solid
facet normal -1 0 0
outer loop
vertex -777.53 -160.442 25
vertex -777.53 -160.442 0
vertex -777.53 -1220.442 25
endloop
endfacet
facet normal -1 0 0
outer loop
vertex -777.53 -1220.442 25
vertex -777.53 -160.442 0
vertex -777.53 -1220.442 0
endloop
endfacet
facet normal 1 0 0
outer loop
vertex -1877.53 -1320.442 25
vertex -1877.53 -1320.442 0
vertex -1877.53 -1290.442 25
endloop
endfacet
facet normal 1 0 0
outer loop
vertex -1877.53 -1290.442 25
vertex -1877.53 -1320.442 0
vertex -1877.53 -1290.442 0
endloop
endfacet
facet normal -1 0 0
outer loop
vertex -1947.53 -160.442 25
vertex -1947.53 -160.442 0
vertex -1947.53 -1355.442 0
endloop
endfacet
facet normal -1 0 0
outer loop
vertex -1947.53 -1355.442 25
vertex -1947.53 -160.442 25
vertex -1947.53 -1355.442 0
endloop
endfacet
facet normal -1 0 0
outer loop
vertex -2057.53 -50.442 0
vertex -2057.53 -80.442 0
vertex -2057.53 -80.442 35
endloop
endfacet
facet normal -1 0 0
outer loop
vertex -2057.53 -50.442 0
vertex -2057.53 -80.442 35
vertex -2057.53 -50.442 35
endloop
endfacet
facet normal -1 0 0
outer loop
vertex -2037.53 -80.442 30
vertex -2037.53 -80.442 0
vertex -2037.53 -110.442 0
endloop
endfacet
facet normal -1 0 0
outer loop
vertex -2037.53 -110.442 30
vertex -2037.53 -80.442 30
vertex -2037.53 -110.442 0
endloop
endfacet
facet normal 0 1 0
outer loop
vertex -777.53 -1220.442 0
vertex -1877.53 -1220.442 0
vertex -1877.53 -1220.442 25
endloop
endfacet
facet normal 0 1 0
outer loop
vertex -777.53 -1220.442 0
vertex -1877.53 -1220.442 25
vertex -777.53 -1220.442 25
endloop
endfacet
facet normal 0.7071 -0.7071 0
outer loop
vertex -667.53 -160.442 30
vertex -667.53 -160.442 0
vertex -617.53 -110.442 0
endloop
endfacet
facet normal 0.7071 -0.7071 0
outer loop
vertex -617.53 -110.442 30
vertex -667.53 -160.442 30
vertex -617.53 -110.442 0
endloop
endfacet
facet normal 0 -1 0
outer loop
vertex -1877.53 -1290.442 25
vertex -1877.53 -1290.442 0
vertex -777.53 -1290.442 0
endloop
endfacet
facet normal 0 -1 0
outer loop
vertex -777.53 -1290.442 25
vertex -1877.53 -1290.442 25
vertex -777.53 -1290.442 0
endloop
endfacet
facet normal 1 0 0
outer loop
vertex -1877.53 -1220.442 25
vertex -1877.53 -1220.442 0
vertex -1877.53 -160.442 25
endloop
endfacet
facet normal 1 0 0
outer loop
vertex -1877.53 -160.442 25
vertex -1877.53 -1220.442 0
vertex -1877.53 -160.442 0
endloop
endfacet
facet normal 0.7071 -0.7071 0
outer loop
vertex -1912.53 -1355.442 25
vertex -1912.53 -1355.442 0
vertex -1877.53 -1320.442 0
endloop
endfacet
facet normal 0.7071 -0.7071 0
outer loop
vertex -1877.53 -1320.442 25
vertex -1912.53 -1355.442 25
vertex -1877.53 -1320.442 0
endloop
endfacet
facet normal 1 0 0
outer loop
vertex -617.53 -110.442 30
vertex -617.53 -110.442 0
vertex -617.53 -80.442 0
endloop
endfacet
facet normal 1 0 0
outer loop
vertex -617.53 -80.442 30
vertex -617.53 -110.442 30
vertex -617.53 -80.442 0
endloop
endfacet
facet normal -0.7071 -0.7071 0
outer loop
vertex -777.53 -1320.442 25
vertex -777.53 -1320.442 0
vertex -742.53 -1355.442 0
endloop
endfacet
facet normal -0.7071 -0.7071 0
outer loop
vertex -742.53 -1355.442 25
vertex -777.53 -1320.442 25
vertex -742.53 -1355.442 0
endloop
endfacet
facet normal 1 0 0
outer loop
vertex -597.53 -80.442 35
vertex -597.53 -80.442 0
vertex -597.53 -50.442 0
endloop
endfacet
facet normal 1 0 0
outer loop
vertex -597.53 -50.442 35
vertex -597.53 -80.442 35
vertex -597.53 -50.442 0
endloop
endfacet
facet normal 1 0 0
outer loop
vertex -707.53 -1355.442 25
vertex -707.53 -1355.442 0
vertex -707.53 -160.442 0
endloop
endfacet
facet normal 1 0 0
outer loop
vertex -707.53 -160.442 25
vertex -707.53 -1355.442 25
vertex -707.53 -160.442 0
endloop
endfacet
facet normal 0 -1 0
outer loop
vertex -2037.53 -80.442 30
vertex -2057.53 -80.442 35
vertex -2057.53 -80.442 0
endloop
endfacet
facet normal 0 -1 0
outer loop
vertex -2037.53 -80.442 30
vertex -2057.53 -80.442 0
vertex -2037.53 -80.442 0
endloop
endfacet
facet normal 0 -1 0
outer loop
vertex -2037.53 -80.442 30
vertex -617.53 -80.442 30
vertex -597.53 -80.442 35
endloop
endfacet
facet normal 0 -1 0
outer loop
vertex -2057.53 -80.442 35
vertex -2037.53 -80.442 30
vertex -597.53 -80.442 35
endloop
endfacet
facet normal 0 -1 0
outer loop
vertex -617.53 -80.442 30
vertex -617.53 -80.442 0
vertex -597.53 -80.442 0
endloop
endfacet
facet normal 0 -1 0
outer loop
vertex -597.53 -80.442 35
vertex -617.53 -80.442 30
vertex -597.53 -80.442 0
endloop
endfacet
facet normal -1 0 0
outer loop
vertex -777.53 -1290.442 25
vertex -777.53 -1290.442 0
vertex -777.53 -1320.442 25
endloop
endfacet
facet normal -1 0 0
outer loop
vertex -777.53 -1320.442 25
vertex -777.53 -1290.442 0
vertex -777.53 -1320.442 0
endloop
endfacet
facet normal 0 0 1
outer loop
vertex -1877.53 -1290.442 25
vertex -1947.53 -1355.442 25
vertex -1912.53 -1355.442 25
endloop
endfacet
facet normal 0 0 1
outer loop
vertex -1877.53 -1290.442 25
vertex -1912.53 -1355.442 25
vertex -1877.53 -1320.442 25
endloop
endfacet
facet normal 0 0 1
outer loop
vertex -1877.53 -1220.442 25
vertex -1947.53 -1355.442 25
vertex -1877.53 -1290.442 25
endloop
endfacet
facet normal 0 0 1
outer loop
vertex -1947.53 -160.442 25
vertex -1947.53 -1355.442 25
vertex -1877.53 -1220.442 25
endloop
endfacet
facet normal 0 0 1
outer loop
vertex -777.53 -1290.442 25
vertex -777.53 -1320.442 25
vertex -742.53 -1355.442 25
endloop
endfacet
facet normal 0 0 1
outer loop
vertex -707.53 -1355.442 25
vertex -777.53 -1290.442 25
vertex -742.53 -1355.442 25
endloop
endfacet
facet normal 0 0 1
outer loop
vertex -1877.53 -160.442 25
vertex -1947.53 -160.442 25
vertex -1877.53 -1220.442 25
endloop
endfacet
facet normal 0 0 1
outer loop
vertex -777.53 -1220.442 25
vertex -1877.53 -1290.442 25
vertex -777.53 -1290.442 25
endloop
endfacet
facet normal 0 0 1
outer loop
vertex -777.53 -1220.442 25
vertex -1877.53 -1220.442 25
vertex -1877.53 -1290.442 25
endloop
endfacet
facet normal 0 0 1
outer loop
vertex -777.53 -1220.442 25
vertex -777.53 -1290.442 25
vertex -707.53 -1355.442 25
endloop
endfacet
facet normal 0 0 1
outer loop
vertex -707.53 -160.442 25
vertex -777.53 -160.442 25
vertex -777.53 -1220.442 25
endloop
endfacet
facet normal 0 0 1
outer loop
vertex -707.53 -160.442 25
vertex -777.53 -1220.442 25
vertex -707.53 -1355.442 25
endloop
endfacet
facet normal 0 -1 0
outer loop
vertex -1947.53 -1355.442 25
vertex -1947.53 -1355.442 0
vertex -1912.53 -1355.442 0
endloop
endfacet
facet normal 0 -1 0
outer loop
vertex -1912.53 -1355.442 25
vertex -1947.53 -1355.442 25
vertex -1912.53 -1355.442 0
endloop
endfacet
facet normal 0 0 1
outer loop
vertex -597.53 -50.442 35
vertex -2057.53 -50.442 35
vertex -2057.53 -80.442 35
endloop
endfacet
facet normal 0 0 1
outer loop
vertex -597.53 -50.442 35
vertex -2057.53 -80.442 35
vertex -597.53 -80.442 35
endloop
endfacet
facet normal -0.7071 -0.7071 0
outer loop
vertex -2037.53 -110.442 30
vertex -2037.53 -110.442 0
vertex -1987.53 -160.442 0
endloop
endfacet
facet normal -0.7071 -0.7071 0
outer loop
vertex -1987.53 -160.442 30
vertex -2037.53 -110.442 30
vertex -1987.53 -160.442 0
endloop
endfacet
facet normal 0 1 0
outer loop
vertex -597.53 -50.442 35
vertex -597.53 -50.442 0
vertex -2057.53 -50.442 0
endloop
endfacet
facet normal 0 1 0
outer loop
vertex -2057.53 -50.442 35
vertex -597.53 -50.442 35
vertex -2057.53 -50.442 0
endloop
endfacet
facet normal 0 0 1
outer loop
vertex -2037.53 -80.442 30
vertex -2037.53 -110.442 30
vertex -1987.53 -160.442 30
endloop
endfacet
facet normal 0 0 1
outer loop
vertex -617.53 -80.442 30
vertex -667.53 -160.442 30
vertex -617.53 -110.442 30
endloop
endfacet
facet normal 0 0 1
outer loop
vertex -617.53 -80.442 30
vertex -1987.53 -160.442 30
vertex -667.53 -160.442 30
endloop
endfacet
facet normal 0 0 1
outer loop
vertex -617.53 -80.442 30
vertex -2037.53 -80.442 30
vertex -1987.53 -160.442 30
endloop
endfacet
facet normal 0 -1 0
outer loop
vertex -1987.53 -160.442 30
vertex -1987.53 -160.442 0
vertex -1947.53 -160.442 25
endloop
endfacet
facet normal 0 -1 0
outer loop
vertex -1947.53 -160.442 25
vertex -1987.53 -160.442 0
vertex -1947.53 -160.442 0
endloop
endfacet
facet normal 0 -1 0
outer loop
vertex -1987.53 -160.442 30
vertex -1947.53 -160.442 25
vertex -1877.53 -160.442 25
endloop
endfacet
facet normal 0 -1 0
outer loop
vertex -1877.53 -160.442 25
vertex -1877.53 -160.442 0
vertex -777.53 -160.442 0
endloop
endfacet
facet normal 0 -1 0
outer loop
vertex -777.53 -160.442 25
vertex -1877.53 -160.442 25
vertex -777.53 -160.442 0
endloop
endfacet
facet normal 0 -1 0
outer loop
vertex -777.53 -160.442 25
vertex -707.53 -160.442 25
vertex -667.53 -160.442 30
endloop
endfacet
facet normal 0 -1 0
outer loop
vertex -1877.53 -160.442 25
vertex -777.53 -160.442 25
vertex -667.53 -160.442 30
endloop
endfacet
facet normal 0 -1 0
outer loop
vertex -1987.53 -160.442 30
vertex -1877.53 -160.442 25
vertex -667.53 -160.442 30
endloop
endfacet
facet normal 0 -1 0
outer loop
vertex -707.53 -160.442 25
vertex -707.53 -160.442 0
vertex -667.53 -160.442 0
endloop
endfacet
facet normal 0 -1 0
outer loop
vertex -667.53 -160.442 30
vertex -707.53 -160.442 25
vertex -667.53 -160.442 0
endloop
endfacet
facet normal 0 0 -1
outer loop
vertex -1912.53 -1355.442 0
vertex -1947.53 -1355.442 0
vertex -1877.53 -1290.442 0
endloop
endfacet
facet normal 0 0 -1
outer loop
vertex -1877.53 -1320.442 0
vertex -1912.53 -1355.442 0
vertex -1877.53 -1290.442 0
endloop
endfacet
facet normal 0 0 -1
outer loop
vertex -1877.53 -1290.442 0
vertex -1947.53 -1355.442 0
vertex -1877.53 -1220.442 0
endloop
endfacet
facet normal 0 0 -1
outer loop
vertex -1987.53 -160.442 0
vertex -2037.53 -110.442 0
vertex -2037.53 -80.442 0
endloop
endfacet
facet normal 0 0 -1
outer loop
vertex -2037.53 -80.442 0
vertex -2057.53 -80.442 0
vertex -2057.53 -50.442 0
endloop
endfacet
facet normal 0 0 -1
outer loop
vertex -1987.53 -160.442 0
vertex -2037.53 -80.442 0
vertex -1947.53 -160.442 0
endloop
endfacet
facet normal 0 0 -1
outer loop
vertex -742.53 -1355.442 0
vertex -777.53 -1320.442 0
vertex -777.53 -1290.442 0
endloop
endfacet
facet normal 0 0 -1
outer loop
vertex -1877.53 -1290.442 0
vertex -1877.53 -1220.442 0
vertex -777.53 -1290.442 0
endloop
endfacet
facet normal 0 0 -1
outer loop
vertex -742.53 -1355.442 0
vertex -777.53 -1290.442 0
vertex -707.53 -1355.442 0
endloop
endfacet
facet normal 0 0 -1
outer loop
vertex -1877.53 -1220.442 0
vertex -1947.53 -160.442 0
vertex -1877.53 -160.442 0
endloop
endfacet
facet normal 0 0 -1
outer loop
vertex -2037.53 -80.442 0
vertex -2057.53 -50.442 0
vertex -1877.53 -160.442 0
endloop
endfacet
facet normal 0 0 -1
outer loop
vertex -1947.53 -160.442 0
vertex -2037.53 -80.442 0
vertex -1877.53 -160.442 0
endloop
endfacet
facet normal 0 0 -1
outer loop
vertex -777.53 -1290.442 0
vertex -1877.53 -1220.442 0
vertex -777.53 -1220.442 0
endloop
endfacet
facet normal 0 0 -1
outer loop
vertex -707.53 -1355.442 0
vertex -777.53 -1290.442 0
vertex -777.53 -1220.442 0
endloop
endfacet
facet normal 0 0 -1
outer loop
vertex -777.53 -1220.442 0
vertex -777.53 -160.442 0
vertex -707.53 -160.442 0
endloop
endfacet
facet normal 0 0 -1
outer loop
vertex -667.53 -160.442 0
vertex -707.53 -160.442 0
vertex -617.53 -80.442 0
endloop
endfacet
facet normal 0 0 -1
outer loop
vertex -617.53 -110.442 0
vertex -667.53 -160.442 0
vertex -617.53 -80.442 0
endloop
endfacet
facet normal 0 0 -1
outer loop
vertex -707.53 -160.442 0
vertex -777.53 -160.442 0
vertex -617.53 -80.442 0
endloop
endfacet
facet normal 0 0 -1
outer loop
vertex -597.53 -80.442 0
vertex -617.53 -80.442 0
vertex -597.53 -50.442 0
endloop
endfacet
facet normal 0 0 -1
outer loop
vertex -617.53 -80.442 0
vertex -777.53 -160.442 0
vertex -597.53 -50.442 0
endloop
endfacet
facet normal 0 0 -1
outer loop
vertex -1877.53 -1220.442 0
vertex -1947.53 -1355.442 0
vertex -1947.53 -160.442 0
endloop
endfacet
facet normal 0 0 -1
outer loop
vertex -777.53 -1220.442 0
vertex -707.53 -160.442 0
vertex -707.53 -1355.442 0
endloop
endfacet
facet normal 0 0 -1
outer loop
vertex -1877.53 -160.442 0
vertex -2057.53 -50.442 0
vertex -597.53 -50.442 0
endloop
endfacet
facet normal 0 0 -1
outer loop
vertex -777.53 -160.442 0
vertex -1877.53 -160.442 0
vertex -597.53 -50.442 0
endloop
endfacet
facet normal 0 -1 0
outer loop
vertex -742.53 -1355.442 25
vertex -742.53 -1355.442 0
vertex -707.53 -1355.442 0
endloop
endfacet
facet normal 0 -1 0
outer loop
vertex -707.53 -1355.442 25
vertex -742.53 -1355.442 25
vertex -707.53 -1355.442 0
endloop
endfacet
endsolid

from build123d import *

# Parameters (mm, degrees)
F1_DEPTH = 30
F0_W     = 20
F0_H     = 30
F0_W_2   = 1420
F2_DEPTH = 35
F0_W_3   = 1100
F0_H_2   = 70
F3_DEPTH = 25


with BuildPart() as f1:
    # F0 (on Top) → F1 (new body)
    with BuildSketch(Plane.XY):
        Polygon((-1947.5297451019, -160.4416549206), (-1877.5297451019, -160.4416549206), (-777.5297451019, -160.4416549206), (-707.5297451019, -160.4416549206), (-667.5297451019, -160.4416549206), (-617.5297451019, -110.4416549206), (-617.5297451019, -80.4416549206), (-2037.5297451019, -80.4416549206), (-2037.5297451019, -110.4416549206), (-1987.5297451019, -160.4416549206), align=None)
    extrude(amount=F1_DEPTH)

    # F0 (on Top) → F2 (join)
    with BuildSketch(Plane.XY):
        with Locations((-2047.5297451019, -65.4416549206)):
            Rectangle(F0_W, F0_H)
        with Locations((-1327.5297451019, -65.4416549206)):
            Rectangle(F0_W_2, F0_H)
        with Locations((-607.5297451019, -65.4416549206)):
            Rectangle(F0_W, F0_H)
    extrude(amount=F2_DEPTH)

    # F0 (on Top) → F3 (join)
    with BuildSketch(Plane.XY):
        Polygon((-1877.5297451019, -1220.4416549206), (-1877.5297451019, -160.4416549206), (-1947.5297451019, -160.4416549206), (-1947.5297451019, -1355.4416549206), (-1912.5297451019, -1355.4416549206), (-1877.5297451019, -1320.4416549206), (-1877.5297451019, -1290.4416549206), align=None)
        with Locations((-1327.5297451019, -1255.4416549206)):
            Rectangle(F0_W_3, F0_H_2)
        Polygon((-707.5297451019, -160.4416549206), (-777.5297451019, -160.4416549206), (-777.5297451019, -1220.4416549206), (-777.5297451019, -1290.4416549206), (-777.5297451019, -1320.4416549206), (-742.5297451019, -1355.4416549206), (-707.5297451019, -1355.4416549206), align=None)
    extrude(amount=F3_DEPTH)


solid = f1.part
